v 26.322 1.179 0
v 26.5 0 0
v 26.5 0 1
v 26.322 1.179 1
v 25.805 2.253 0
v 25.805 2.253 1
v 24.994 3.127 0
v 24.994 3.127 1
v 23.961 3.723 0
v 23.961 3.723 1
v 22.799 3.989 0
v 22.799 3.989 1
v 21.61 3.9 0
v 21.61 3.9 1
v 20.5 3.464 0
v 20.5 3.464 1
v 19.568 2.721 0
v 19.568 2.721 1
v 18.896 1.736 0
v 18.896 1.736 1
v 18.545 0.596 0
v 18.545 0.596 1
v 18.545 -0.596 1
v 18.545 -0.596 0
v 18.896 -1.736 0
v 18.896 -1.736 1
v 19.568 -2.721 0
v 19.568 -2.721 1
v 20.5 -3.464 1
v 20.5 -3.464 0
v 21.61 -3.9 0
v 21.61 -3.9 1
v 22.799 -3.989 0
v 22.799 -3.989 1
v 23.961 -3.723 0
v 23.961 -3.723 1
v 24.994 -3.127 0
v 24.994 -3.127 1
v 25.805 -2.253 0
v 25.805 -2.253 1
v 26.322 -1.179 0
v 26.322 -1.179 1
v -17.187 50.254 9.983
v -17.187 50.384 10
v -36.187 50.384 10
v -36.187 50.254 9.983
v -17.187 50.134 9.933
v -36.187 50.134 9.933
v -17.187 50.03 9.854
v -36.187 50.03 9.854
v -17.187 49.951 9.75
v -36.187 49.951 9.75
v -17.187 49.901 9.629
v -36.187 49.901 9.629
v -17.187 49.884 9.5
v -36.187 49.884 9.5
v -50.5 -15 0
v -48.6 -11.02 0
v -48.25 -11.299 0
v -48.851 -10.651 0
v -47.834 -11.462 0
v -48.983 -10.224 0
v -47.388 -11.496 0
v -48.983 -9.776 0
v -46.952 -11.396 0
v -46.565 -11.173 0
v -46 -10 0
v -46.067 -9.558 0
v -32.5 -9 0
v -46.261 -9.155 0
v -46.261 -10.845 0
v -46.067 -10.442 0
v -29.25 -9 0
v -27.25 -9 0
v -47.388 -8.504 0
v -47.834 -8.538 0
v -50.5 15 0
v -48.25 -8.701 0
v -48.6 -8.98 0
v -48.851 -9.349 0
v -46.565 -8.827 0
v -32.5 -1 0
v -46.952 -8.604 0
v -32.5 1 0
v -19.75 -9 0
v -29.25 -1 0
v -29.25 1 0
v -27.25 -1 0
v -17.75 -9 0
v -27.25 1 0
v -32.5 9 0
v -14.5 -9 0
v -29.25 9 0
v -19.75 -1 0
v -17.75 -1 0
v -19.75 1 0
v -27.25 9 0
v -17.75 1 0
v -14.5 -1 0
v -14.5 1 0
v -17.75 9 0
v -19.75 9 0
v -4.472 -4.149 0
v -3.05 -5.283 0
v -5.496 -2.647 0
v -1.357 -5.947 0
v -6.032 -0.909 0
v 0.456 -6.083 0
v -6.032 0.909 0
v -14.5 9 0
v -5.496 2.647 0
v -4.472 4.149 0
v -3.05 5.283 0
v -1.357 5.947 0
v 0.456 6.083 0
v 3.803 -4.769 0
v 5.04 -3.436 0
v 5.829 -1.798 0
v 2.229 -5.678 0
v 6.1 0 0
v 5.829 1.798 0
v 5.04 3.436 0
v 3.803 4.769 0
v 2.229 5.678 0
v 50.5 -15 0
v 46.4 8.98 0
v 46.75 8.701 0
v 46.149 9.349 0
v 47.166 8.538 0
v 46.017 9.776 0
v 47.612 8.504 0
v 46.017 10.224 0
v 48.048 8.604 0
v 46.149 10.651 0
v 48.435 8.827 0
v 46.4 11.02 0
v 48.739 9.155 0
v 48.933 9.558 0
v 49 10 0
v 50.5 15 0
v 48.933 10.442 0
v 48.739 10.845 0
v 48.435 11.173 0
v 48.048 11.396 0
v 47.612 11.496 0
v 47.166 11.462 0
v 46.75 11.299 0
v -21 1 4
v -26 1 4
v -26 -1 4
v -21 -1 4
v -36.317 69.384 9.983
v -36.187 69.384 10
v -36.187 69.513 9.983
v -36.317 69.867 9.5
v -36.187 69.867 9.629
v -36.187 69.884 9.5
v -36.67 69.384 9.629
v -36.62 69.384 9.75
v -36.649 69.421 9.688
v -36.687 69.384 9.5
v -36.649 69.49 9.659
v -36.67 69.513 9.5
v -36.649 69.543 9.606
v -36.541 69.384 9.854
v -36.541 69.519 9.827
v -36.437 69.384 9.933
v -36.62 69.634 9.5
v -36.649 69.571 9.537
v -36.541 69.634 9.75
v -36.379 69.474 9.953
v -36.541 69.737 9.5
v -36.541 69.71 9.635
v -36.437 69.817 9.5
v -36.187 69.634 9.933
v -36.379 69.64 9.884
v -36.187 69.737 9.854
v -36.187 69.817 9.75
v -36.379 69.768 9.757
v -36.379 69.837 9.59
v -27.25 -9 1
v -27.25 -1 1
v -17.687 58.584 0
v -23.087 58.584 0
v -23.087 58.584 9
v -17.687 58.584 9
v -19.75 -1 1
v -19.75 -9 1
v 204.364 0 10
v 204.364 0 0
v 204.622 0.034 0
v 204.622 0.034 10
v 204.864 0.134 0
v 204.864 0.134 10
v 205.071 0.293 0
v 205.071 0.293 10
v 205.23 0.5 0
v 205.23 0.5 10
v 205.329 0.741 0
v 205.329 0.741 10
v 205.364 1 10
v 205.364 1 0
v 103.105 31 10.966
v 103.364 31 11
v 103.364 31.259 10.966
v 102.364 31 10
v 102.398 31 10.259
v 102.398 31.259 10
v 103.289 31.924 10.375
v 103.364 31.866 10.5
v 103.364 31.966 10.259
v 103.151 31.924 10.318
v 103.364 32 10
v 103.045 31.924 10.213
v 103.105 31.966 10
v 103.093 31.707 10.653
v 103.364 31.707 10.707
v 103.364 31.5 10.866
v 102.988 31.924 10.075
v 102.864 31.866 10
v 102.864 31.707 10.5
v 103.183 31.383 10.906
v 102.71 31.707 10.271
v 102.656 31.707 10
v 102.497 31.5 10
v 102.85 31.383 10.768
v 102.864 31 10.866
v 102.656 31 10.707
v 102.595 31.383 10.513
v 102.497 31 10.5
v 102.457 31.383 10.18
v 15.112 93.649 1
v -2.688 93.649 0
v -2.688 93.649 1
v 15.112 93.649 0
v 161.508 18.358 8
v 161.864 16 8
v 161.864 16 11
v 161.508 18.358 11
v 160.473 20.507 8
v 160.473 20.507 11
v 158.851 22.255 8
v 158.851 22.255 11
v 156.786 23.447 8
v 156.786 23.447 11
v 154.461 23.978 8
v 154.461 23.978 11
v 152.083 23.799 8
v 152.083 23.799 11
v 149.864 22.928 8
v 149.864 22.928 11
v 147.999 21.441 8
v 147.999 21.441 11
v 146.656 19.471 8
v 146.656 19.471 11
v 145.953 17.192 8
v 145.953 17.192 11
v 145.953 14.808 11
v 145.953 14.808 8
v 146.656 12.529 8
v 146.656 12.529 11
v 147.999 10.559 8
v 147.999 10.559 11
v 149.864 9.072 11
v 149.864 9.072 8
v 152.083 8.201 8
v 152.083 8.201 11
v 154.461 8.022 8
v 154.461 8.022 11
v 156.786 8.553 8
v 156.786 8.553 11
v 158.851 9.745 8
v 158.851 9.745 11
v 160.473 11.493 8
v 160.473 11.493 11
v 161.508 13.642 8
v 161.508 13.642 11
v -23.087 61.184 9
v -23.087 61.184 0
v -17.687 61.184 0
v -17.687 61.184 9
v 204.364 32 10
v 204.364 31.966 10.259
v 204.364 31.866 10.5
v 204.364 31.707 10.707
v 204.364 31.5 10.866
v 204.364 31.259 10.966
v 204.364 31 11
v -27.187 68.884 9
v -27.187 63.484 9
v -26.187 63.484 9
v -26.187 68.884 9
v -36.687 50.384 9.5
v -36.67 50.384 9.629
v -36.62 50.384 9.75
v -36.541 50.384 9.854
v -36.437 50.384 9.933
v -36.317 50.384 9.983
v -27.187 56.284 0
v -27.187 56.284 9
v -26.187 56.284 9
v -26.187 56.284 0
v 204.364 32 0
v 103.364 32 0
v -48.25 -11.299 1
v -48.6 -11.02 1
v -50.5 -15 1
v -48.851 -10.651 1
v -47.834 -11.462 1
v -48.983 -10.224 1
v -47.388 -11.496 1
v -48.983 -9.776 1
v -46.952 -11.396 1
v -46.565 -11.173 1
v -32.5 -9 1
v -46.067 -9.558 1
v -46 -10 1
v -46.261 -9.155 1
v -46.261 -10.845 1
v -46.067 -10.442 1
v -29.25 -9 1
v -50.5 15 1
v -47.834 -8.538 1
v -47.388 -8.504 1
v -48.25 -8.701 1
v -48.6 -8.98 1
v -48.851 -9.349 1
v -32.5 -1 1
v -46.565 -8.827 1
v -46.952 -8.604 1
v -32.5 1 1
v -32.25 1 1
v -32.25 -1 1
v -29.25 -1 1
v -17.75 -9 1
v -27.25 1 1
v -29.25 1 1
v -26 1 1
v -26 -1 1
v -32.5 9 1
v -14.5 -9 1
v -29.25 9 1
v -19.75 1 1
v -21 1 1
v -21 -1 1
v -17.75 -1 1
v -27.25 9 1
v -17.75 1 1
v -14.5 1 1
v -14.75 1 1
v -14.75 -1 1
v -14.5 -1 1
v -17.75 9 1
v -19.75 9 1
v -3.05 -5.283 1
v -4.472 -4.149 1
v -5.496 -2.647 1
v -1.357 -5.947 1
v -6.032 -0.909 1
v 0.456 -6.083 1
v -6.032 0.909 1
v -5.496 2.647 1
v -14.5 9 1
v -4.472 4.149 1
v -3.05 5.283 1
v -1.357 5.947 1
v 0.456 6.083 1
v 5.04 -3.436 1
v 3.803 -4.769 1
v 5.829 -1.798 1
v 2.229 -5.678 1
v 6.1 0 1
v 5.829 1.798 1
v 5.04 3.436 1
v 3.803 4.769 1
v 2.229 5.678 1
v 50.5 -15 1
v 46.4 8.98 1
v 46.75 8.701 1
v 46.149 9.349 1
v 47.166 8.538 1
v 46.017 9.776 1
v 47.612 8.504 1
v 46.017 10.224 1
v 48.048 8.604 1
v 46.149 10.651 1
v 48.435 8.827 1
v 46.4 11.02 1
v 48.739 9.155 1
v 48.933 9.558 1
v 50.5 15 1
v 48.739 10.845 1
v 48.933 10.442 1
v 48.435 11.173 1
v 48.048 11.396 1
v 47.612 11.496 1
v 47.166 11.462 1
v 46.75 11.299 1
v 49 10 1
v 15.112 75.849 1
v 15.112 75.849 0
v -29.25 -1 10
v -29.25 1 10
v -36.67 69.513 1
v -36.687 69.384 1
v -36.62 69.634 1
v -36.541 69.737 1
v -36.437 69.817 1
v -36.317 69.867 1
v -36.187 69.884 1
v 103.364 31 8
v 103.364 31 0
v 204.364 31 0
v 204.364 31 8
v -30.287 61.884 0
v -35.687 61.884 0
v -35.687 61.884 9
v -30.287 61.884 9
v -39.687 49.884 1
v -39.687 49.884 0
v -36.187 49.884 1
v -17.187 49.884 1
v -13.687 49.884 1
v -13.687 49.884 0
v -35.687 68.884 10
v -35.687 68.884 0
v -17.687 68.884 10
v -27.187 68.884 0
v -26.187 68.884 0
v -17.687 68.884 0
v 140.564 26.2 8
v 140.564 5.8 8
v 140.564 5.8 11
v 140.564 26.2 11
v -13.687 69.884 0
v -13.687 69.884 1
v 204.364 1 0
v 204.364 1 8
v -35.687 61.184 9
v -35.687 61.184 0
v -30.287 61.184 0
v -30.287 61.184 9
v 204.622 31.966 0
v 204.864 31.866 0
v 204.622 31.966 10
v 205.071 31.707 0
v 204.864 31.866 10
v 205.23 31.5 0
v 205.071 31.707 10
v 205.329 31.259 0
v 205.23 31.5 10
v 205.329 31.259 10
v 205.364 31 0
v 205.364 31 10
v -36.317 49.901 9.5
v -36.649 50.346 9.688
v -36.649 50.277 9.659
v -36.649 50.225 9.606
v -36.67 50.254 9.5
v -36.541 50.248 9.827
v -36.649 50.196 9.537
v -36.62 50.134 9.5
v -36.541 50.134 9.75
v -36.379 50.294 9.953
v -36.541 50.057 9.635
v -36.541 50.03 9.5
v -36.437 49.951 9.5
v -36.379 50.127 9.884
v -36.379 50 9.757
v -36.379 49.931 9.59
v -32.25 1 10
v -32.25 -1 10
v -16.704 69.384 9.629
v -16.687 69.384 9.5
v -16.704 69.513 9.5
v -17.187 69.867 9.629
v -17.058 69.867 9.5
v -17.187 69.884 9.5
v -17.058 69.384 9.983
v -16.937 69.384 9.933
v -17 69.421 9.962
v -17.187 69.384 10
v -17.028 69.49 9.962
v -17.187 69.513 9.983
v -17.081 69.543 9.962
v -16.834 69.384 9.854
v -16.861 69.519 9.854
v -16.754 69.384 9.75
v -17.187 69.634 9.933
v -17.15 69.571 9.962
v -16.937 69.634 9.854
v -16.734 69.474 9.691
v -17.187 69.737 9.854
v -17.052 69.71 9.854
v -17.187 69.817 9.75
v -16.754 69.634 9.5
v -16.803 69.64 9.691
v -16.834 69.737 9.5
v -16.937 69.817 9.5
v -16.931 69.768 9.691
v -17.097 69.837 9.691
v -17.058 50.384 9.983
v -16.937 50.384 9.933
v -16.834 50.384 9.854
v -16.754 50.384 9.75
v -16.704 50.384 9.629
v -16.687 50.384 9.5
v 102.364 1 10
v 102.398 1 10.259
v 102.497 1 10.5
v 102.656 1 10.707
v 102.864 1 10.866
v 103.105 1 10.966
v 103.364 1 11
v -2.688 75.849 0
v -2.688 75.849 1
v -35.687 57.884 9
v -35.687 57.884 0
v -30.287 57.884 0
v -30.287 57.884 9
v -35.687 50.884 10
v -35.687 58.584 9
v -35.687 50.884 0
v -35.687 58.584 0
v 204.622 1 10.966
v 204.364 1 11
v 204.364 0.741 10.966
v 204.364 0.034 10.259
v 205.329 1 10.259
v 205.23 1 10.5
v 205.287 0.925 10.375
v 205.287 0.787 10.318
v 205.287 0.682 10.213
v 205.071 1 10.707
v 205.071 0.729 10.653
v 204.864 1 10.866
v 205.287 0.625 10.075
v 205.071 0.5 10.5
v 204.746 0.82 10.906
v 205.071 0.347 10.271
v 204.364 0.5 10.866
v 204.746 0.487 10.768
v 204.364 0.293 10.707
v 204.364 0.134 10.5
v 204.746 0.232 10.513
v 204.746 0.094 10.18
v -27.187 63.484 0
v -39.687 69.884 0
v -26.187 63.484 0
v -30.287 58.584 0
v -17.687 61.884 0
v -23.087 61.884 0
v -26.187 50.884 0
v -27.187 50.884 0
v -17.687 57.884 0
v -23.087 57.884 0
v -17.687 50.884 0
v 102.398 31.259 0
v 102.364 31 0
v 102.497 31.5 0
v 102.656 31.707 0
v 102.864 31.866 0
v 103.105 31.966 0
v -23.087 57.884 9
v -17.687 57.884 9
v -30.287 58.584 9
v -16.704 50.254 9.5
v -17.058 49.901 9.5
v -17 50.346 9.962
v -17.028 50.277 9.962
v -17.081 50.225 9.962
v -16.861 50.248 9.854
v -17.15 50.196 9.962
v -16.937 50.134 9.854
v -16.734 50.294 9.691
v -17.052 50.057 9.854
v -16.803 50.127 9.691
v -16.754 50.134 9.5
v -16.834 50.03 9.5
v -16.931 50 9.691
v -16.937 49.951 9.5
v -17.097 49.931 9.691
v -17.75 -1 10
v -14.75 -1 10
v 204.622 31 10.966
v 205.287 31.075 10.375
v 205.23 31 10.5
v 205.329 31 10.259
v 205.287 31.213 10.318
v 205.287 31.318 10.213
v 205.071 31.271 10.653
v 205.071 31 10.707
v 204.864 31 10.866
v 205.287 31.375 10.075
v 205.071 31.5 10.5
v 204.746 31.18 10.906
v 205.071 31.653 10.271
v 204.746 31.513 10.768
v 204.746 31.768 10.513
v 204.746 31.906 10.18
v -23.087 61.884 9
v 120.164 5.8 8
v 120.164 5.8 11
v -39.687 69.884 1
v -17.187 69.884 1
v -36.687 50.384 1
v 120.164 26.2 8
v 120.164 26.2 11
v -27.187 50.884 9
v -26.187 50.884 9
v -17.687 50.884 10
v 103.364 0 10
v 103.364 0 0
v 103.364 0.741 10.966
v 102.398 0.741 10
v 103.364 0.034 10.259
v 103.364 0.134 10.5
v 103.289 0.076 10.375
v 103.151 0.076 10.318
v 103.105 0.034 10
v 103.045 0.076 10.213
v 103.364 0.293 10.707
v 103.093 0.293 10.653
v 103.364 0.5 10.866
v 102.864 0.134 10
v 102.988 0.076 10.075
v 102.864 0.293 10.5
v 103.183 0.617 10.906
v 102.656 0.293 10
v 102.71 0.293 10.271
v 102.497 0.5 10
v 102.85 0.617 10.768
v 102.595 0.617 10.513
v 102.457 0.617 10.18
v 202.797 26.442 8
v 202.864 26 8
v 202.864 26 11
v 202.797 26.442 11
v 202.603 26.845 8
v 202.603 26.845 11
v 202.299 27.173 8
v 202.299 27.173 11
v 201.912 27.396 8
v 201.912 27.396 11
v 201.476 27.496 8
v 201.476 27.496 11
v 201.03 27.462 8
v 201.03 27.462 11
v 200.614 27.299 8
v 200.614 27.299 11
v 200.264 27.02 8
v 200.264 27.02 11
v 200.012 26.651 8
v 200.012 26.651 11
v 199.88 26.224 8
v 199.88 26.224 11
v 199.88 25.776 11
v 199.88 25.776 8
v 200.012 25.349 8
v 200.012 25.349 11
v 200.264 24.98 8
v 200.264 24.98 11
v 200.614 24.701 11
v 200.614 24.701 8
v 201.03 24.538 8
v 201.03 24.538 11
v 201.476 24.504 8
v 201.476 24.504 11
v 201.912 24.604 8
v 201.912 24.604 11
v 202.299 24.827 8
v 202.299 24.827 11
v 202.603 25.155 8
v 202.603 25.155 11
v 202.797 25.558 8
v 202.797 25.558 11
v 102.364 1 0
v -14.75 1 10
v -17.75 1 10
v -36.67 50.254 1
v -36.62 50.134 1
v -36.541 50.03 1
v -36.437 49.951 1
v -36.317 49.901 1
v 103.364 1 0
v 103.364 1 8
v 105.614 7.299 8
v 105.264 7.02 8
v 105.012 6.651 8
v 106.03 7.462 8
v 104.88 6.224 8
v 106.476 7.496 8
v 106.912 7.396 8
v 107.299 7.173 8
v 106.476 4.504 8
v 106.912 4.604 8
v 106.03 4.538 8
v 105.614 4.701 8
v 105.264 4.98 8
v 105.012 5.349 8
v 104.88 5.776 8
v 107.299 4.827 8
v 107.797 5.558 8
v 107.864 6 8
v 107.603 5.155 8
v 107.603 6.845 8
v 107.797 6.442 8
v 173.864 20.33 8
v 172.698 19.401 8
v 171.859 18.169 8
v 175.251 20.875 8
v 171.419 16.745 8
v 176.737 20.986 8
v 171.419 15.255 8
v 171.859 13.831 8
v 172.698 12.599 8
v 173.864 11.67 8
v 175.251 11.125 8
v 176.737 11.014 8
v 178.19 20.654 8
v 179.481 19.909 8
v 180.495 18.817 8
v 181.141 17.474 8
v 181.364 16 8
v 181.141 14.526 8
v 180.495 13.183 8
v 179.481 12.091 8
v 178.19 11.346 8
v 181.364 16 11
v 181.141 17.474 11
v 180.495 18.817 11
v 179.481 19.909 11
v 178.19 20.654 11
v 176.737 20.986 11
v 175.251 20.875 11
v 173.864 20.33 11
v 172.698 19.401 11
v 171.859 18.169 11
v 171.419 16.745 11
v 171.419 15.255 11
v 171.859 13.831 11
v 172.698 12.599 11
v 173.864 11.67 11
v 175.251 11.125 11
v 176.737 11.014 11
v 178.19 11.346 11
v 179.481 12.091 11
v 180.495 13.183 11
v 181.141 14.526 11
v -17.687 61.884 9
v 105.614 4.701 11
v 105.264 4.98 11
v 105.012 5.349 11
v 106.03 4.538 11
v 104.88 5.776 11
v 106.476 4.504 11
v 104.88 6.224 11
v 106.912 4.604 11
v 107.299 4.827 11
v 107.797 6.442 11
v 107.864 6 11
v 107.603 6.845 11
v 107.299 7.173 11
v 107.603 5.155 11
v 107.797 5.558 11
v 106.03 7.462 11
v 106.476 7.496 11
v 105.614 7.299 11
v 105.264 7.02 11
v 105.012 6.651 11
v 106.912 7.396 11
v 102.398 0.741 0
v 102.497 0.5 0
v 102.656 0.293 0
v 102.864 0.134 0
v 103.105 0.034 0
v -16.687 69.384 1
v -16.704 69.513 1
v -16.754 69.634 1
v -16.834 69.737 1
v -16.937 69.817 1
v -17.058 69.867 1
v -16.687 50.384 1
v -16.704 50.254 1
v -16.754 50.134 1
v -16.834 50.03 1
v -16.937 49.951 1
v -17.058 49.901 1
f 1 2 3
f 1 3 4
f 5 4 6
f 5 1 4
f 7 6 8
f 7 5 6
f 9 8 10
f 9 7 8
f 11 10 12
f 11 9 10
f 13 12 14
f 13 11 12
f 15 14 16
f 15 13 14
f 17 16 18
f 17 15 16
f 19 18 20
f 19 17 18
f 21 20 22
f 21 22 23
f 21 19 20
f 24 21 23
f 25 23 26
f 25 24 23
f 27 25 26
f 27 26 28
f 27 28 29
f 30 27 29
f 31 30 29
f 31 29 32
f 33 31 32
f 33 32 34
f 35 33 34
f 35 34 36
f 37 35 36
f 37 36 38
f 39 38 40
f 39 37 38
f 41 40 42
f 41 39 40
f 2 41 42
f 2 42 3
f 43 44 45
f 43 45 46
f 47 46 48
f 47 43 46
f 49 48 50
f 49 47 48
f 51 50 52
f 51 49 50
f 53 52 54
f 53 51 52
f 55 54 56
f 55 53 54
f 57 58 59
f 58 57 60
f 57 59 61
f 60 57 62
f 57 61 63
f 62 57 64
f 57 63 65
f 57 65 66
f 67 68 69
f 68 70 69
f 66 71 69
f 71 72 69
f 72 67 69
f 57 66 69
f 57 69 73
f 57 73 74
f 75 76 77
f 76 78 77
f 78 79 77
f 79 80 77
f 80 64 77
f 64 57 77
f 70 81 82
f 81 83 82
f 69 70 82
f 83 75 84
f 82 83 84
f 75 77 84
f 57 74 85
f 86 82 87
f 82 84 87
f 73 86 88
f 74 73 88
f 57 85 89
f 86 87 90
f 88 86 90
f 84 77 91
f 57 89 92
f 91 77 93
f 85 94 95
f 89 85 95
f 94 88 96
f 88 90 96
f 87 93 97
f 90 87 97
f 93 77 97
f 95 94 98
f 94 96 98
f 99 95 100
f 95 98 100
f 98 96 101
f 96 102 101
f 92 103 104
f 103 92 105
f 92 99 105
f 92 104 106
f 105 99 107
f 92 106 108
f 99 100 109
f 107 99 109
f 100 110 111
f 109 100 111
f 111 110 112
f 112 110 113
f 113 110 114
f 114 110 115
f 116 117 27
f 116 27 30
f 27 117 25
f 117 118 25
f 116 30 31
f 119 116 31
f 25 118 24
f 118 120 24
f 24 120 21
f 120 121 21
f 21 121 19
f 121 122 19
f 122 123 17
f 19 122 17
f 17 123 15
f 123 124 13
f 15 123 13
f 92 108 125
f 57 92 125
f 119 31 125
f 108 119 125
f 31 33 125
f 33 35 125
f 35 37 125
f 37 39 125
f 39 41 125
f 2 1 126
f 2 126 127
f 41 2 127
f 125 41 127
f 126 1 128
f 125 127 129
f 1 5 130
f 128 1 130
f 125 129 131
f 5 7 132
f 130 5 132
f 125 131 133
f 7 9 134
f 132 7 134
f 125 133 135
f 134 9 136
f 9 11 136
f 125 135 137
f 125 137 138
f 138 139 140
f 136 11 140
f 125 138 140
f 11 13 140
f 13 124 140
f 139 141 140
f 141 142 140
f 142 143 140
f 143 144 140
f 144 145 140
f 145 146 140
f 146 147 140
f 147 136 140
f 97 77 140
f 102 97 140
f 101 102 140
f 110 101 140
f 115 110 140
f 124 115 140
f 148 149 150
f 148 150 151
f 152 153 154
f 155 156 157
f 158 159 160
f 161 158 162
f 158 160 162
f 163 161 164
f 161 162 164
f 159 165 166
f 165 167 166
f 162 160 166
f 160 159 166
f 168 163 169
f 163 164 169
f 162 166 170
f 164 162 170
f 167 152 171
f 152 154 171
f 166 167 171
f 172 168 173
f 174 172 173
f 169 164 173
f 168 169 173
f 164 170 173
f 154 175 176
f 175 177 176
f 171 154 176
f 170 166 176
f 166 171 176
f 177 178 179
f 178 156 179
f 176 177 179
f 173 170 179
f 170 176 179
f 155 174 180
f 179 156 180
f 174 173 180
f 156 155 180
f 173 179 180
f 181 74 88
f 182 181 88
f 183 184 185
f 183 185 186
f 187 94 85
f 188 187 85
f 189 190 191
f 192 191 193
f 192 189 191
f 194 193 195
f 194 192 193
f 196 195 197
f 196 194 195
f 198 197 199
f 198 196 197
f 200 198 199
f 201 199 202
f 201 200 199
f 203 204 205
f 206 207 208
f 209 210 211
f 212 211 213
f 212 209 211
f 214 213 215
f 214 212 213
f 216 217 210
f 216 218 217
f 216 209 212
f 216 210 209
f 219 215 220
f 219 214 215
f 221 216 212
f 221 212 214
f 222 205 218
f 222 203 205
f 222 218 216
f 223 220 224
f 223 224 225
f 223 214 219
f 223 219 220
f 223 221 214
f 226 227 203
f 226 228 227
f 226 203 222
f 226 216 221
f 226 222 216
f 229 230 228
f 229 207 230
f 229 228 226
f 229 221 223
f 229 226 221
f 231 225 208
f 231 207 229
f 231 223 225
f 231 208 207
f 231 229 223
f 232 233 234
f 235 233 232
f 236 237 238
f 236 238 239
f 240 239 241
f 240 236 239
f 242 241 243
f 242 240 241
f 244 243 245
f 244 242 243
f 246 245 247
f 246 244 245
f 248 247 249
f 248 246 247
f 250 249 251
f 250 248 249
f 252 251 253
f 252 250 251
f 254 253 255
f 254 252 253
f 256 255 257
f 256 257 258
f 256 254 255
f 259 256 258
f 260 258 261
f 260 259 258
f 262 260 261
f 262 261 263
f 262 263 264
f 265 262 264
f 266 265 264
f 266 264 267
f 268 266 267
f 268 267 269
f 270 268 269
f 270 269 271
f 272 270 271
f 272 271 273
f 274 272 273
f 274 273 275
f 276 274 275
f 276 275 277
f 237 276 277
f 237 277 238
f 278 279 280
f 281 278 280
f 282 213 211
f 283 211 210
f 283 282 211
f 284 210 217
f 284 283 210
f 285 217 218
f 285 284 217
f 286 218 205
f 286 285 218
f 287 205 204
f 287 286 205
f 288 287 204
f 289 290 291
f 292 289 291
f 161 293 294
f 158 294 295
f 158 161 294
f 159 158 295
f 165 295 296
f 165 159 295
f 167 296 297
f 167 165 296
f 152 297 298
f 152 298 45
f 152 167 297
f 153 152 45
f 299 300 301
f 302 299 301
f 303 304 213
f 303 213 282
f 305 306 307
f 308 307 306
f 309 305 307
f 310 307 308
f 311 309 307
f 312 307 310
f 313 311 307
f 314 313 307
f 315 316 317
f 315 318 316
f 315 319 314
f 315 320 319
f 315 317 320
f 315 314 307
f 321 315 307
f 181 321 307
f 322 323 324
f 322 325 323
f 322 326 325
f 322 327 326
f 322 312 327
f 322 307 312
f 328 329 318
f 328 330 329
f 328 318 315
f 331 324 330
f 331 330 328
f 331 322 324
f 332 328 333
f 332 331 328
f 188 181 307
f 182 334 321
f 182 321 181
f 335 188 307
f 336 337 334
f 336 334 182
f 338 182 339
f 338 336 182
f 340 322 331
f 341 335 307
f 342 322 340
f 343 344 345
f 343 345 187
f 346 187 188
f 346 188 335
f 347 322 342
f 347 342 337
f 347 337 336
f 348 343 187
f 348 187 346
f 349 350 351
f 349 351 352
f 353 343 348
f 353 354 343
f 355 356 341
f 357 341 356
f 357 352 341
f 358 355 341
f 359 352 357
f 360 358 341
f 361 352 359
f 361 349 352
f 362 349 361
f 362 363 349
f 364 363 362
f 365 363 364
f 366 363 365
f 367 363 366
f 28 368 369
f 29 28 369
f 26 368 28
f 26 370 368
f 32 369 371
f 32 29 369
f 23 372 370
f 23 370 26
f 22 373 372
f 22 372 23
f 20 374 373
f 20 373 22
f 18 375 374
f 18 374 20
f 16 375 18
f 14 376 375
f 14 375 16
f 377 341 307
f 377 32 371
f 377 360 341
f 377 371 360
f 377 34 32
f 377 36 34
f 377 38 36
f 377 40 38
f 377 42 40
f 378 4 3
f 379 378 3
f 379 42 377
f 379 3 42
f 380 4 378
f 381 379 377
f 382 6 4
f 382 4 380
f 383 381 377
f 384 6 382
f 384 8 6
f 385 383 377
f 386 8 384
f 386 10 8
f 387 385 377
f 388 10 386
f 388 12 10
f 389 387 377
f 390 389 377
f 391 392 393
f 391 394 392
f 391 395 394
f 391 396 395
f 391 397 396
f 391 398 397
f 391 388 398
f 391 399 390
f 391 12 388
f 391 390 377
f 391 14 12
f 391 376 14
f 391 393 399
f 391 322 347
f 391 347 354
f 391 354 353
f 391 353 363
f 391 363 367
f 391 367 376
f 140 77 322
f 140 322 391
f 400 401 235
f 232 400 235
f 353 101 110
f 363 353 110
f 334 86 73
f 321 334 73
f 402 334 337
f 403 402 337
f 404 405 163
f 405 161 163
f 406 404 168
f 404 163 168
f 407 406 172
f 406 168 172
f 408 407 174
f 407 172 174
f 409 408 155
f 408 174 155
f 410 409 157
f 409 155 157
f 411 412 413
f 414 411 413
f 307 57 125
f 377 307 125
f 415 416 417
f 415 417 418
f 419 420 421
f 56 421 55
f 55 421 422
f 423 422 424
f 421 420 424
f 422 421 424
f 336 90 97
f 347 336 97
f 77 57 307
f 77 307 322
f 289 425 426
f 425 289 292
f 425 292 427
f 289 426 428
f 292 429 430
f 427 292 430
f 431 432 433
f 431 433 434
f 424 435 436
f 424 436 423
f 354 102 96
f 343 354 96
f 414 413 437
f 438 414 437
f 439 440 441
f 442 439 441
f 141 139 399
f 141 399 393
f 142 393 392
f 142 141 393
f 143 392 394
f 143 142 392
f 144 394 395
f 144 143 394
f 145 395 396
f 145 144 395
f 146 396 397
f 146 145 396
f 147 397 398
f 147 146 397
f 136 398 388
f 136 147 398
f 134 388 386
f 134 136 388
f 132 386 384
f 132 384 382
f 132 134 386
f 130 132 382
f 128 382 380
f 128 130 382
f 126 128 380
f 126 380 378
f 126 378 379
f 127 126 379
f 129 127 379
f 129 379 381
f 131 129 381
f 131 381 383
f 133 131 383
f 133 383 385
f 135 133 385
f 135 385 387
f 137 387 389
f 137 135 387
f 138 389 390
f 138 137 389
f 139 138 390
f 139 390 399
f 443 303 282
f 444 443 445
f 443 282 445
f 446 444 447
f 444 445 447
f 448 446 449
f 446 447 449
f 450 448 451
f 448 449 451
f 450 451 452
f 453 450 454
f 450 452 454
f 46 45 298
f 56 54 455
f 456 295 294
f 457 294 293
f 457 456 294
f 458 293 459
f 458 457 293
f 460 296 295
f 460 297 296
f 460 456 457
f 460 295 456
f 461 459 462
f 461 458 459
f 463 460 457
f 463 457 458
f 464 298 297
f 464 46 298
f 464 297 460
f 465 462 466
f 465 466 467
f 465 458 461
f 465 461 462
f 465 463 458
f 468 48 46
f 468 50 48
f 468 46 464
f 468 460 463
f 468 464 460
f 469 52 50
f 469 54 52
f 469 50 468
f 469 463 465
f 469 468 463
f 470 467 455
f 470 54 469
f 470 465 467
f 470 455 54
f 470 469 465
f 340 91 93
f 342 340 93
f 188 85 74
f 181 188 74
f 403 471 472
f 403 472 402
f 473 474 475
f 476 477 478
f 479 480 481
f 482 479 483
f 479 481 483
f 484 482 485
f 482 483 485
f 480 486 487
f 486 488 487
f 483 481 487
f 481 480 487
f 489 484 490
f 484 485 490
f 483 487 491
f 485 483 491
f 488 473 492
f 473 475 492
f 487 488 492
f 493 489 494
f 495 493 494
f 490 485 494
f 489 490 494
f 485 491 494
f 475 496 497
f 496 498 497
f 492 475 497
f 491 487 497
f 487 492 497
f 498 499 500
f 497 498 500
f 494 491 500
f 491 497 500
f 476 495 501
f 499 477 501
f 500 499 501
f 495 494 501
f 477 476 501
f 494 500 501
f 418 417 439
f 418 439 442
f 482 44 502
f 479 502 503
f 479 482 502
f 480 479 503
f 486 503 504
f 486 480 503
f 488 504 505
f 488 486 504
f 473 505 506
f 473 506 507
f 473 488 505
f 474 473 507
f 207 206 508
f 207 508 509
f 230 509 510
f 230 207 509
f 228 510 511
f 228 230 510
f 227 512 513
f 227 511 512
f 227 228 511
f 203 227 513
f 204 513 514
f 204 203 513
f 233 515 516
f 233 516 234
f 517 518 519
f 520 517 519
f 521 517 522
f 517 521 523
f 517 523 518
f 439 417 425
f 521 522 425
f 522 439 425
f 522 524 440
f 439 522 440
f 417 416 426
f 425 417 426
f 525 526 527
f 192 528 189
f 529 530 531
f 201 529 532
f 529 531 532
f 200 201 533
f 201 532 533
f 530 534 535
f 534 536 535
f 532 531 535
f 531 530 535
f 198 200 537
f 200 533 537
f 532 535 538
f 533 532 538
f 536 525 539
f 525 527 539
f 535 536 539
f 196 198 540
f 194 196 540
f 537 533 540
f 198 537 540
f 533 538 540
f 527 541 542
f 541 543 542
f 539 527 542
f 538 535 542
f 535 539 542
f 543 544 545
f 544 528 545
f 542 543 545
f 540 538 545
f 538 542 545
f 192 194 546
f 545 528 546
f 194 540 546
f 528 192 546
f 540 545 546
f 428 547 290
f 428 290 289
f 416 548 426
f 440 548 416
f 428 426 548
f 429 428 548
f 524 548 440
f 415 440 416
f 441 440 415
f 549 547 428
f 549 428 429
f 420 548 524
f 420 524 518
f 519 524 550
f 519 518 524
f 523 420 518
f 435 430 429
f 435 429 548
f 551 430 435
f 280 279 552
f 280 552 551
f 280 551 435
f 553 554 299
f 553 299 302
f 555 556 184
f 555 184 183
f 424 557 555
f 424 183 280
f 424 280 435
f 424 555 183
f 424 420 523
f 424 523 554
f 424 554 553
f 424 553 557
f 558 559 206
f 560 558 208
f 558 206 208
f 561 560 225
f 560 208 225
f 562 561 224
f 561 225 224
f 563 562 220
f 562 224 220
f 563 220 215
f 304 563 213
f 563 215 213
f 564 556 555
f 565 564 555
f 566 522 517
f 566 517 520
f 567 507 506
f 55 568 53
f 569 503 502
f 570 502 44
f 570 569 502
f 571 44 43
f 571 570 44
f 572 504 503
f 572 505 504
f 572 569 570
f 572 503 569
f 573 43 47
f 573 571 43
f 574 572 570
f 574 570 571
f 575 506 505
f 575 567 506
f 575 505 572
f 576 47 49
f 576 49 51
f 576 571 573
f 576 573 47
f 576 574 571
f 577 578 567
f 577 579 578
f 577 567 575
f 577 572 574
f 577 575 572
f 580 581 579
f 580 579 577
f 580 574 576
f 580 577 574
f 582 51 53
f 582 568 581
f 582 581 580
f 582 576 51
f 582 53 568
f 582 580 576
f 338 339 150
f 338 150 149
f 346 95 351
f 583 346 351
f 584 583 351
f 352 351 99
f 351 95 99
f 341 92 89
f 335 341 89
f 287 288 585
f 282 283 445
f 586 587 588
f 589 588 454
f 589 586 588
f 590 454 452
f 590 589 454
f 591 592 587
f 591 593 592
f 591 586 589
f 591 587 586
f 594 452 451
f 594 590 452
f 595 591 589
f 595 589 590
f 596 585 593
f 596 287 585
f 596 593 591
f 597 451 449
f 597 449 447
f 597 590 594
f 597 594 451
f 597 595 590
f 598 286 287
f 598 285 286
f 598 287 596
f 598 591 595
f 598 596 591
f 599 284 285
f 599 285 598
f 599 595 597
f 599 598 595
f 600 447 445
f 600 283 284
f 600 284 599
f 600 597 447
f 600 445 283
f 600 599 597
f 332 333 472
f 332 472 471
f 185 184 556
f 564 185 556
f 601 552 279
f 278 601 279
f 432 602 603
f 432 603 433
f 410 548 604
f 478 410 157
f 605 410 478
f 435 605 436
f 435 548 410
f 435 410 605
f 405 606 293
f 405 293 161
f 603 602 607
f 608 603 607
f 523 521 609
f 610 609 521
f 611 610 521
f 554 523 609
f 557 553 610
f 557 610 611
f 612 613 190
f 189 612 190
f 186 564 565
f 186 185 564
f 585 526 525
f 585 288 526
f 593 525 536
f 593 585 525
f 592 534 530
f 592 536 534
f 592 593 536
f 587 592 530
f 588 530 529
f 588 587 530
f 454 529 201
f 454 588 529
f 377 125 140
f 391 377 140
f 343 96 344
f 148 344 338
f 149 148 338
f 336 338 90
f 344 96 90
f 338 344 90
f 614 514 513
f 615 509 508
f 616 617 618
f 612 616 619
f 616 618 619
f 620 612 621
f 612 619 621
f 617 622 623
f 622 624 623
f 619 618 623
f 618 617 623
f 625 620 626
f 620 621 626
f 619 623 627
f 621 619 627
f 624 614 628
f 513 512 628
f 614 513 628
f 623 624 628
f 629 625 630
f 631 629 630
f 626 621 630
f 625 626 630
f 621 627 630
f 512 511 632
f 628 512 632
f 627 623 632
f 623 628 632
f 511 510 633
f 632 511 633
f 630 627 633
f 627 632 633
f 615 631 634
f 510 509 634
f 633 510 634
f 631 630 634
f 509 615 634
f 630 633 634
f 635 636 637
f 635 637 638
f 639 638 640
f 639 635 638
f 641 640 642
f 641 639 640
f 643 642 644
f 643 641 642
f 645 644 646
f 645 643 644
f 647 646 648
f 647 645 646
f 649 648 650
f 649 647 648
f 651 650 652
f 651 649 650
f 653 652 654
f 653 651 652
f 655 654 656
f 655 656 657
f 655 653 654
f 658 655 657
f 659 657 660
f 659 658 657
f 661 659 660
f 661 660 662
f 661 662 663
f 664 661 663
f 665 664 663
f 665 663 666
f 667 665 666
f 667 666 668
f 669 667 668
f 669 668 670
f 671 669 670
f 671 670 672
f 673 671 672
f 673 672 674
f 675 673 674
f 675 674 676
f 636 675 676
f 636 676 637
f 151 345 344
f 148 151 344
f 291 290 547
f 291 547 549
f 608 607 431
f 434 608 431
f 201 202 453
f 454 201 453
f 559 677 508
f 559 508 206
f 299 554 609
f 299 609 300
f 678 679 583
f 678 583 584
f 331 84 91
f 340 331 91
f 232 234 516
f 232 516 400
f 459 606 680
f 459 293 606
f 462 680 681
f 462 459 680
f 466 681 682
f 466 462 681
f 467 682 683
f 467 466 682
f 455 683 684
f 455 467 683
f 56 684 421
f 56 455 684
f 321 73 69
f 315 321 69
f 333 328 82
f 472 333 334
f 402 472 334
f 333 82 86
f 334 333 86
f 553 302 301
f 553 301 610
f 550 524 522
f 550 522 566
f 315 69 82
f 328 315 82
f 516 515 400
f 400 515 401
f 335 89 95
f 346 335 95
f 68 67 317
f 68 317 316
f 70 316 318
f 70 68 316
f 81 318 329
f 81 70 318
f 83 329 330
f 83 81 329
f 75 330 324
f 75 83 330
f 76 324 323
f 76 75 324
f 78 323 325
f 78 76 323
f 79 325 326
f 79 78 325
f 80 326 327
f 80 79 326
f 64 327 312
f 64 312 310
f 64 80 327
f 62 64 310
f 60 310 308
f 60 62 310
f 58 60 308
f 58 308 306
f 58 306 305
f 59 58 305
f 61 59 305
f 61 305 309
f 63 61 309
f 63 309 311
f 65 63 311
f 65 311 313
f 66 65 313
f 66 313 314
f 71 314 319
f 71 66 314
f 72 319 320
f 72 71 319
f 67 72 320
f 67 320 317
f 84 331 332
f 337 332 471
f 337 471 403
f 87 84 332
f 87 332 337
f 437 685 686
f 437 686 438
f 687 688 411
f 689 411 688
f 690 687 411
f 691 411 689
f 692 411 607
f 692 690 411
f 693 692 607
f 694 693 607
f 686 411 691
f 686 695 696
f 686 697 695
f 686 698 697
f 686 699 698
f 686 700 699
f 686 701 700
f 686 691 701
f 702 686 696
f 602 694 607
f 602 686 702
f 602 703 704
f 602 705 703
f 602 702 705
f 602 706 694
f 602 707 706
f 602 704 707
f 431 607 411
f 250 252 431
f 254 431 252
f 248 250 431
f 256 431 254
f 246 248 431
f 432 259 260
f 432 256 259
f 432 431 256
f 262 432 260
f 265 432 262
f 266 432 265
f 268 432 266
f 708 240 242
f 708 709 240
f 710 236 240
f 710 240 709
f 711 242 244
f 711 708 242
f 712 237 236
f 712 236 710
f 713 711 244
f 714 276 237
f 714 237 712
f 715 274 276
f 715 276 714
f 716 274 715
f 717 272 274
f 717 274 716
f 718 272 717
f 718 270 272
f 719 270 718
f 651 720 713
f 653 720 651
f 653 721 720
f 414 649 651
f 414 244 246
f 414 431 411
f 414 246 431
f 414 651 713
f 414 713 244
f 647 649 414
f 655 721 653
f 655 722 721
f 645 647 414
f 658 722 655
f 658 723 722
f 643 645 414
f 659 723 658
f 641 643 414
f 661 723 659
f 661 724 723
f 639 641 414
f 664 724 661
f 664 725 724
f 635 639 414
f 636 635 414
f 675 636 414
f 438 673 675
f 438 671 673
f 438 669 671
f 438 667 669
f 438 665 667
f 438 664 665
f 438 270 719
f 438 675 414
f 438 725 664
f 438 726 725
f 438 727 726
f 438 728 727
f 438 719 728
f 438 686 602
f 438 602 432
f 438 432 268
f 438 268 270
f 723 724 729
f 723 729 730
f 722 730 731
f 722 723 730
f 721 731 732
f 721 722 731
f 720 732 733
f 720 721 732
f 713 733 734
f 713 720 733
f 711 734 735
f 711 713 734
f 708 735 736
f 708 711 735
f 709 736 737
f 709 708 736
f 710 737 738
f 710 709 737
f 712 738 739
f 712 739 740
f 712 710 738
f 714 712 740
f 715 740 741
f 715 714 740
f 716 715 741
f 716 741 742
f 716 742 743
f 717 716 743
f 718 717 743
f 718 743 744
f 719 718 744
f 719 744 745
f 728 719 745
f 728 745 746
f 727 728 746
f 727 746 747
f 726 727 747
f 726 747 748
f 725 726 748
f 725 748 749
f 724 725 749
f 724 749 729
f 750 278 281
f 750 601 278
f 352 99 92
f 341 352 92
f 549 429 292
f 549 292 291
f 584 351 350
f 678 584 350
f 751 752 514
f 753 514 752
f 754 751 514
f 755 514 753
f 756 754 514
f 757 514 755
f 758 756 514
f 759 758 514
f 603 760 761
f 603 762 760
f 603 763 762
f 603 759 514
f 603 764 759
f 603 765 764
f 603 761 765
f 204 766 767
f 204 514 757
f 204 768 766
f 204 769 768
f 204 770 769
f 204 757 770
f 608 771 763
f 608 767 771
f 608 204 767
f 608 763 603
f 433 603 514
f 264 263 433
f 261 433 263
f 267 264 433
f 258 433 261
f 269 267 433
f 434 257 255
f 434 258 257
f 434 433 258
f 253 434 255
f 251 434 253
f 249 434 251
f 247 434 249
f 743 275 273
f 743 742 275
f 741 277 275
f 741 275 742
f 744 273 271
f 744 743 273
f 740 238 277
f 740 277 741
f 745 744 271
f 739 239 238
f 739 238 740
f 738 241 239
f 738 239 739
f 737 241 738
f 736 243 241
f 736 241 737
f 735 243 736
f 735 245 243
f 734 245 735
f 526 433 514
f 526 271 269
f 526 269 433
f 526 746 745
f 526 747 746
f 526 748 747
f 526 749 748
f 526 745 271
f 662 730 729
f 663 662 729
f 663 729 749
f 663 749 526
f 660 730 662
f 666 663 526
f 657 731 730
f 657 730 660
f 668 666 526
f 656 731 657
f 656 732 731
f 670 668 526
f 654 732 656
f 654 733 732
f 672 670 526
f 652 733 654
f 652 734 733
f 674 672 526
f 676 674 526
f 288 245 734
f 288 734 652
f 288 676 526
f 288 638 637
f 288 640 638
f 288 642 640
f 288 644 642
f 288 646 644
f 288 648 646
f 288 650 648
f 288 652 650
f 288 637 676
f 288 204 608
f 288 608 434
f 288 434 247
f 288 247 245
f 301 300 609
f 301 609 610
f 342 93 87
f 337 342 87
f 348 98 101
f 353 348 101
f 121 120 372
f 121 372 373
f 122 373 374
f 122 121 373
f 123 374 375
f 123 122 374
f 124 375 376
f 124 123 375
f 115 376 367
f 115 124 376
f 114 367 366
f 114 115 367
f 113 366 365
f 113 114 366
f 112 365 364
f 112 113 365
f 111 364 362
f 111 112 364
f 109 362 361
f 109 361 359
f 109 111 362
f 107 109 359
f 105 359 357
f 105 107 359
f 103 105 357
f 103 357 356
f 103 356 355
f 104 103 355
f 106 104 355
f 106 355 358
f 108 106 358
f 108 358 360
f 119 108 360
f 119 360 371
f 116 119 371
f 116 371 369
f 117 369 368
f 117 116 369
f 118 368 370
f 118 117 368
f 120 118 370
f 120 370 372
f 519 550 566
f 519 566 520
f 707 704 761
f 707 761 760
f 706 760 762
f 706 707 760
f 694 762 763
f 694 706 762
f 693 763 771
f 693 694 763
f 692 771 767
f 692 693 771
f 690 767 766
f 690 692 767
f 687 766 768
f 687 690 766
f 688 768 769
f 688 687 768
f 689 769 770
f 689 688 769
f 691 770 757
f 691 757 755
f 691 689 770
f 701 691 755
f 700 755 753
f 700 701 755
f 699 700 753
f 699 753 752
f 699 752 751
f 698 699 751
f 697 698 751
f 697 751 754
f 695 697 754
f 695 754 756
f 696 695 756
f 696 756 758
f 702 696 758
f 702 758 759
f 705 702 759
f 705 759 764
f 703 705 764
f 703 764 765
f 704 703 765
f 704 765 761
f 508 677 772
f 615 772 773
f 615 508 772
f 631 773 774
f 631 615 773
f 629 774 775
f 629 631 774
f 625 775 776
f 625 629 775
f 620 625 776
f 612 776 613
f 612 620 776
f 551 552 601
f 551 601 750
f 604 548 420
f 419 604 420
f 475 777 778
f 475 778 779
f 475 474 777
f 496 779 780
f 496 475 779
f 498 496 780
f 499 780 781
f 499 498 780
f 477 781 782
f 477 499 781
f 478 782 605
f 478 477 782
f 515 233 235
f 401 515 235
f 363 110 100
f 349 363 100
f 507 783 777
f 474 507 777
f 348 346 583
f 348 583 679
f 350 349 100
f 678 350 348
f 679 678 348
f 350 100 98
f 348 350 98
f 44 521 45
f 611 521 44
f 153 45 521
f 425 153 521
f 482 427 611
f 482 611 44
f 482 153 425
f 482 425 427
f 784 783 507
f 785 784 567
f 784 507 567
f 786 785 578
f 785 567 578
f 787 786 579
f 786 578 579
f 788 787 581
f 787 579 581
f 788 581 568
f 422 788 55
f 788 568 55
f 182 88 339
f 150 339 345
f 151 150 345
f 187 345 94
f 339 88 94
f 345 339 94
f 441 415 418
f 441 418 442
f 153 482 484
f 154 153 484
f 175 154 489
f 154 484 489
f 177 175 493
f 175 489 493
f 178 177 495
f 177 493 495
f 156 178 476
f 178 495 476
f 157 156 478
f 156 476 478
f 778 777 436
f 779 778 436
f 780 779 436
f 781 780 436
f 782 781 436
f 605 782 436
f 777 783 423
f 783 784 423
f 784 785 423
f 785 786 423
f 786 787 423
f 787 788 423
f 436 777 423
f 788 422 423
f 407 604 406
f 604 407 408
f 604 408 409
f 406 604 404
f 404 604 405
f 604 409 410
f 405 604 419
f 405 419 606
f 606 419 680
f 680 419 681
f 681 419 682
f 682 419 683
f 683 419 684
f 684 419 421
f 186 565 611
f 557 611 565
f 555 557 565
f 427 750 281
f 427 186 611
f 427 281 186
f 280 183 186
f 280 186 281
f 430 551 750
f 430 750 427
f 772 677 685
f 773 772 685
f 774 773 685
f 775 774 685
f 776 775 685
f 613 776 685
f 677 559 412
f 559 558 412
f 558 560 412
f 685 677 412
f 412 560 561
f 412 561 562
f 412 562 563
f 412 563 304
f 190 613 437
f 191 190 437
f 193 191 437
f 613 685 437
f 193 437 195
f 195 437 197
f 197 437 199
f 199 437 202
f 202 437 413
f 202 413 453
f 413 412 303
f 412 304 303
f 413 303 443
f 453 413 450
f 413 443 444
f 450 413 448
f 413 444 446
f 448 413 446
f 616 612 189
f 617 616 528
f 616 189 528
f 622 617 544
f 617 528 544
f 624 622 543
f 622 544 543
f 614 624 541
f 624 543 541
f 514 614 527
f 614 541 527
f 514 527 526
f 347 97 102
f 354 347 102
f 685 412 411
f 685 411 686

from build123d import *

# Parameters (mm, degrees)
F0_W      = 101
F0_H      = 30
F0_R      = 1.5
F0_R_2    = 6.1
F0_R_3    = 4
F1_DEPTH  = 1
F2_W      = 3
F2_H      = 2
F3_DEPTH  = 9
F4_W      = 20
F4_H      = 20
F5_DEPTH  = 10
F6_T      = -1
F7_W      = 8.5
F7_H      = 0.7
F8_DEPTH  = 9
F9_W      = 7.2
F9_H      = 7.2
F10_DEPTH = 9
F11_W     = 3
F11_H     = 20
F12_DEPTH = 1
F13_W     = 18
F13_H     = 18
F14_DEPTH = 1
F15_R     = 0.5
F4_W_2    = 17.8
F4_H_2    = 17.8
F16_DEPTH = 1
F17_W     = 5
F17_H     = 2
F18_DEPTH = 3
F19_W     = 103
F19_H     = 32
F19_R     = 1.5
F19_W_2   = 20.4
F19_H_2   = 20.4
F19_R_2   = 8
F19_R_3   = 5
F20_DEPTH = 11
F21_W     = 101
F21_H     = 30
F22_DEPTH = 8
F23_R     = 1


with BuildPart() as f1:
    # F0 (on Top) → F1 (new body)
    with BuildSketch(Plane.XY):
        Rectangle(F0_W, F0_H)
        with Locations((-47.5, -10)):
            Circle(F0_R, mode=Mode.SUBTRACT)
        Polygon((-32.5, 1), (-32.5, 9), (-29.25, 9), (-27.25, 9), (-19.75, 9), (-17.75, 9), (-14.5, 9), (-14.5, 1), (-14.5, -1), (-14.5, -9), (-17.75, -9), (-19.75, -9), (-27.25, -9), (-29.25, -9), (-32.5, -9), (-32.5, -1), align=None, mode=Mode.SUBTRACT)
        Circle(F0_R_2, mode=Mode.SUBTRACT)
        with Locations((22.5, 0)):
            Circle(F0_R_3, mode=Mode.SUBTRACT)
        with Locations((47.5, 10)):
            Circle(F0_R, mode=Mode.SUBTRACT)
        Polygon((-27.25, 9), (-29.25, 9), (-29.25, 1), (-32.5, 1), (-32.5, -1), (-29.25, -1), (-29.25, -9), (-27.25, -9), (-27.25, -1), (-19.75, -1), (-19.75, -9), (-17.75, -9), (-17.75, -1), (-14.5, -1), (-14.5, 1), (-17.75, 1), (-17.75, 9), (-19.75, 9), (-19.75, 1), (-27.25, 1), align=None)
    extrude(amount=F1_DEPTH)

    # F2 (on face) → F3 (join)
    with BuildSketch(Plane.XY.offset(1)):
        with Locations((-30.75, 0)):
            Rectangle(F2_W, F2_H)
        with Locations((-16.25, 0)):
            Rectangle(F2_W, F2_H)
    extrude(amount=F3_DEPTH)

    # F17 (on face) → F18 (join)
    with BuildSketch(Plane.XY.offset(1)):
        with Locations((-23.5, 0)):
            Rectangle(F17_W, F17_H)
    extrude(amount=F18_DEPTH)


with BuildPart() as f5:
    # F4 (on Top) → F5 (new body)
    with BuildSketch(Plane.XY):
        with Locations((-26.687329, 59.883659)):
            Rectangle(F4_W, F4_H)
    extrude(amount=F5_DEPTH)

    # F6
    f6_openings = [f5.faces().sort_by_distance(p)[0] for p in [
        (-26.687329, 59.883659, 0),
    ]]
    offset(amount=F6_T, openings=f6_openings)

    # F7 (on face) → F8 (join)
    with BuildSketch(Plane(origin=(0, 0, 0), x_dir=(1, 0, 0), z_dir=(0, 0, -1))):
        with Locations((-31.437329, -58.233659)):
            Rectangle(F7_W, F7_H)
        Polygon((-27.187329, -50.883659), (-27.187329, -57.883659), (-27.187329, -58.583659), (-27.187329, -61.183659), (-27.187329, -61.883659), (-27.187329, -68.883659), (-26.187329, -68.883659), (-26.187329, -61.883659), (-26.187329, -61.183659), (-26.187329, -58.583659), (-26.187329, -57.883659), (-26.187329, -50.883659), align=None)
        with Locations((-31.437329, -61.533659)):
            Rectangle(F7_W, F7_H)
        with Locations((-21.937329, -58.233659)):
            Rectangle(F7_W, F7_H)
        with Locations((-21.937329, -61.533659)):
            Rectangle(F7_W, F7_H)
    extrude(amount=-F8_DEPTH)

    # F9 (on face) → F10 (cut)
    with BuildSketch(Plane(origin=(0, 0, 0), x_dir=(1, 0, 0), z_dir=(0, 0, -1))):
        with Locations((-26.687329, -59.883659)):
            Rectangle(F9_W, F9_H)
    extrude(amount=-F10_DEPTH, mode=Mode.SUBTRACT)

    # F11 (on face) → F12 (join)
    with BuildSketch(Plane(origin=(0, 0, 0), x_dir=(1, 0, 0), z_dir=(0, 0, -1))):
        with Locations((-38.187329, -59.883659)):
            Rectangle(F11_W, F11_H)
        with Locations((-15.187329, -59.883659)):
            Rectangle(F11_W, F11_H)
    extrude(amount=-F12_DEPTH)

    # F13 (on face) → F14 (cut)
    with BuildSketch(Plane.XY.offset(10)):
        with Locations((-26.687329, 59.883659)):
            Rectangle(F13_W, F13_H)
    extrude(amount=-F14_DEPTH, mode=Mode.SUBTRACT)

    # F15
    f15_edges = [f5.edges().sort_by_distance(p)[0] for p in [
        (-16.687329, 49.883659, 5.5),
        (-16.687329, 69.883659, 5.5),
        (-16.687329, 59.883659, 10),
        (-26.687329, 69.883659, 10),
        (-26.687329, 49.883659, 10),
        (-36.687329, 59.883659, 10),
        (-36.687329, 49.883659, 5.5),
        (-36.687329, 69.883659, 5.5),
    ]]
    fillet(f15_edges, radius=F15_R)


with BuildPart() as f16:
    # F4 (on Top) → F16 (new body)
    with BuildSketch(Plane.XY):
        with Locations((6.211989, 84.749466)):
            Rectangle(F4_W_2, F4_H_2)
    extrude(amount=F16_DEPTH)


with BuildPart() as f20:
    # F19 (on Top) → F20 (new body)
    with BuildSketch(Plane.XY):
        with Locations((153.863519, 16)):
            Rectangle(F19_W, F19_H)
        with Locations((106.363519, 6)):
            Circle(F19_R, mode=Mode.SUBTRACT)
        with Locations((130.363519, 16)):
            Rectangle(F19_W_2, F19_H_2, mode=Mode.SUBTRACT)
        with Locations((153.863519, 16)):
            Circle(F19_R_2, mode=Mode.SUBTRACT)
        with Locations((176.363519, 16)):
            Circle(F19_R_3, mode=Mode.SUBTRACT)
        with Locations((201.363519, 26)):
            Circle(F19_R, mode=Mode.SUBTRACT)
    extrude(amount=F20_DEPTH)

    # F21 (on face) → F22 (cut)
    with BuildSketch(Plane(origin=(0, 0, 0), x_dir=(1, 0, 0), z_dir=(0, 0, -1))):
        with Locations((153.863519, -16)):
            Rectangle(F21_W, F21_H)
    extrude(amount=-F22_DEPTH, mode=Mode.SUBTRACT)

    # F23
    f23_edges = [f20.edges().sort_by_distance(p)[0] for p in [
        (102.363519, 16, 11),
        (153.863519, 32, 11),
        (153.863519, 0, 11),
        (205.363519, 16, 11),
        (205.363519, 32, 5.5),
        (205.363519, 0, 5.5),
        (102.363519, 32, 5.5),
        (102.363519, 0, 5.5),
    ]]
    fillet(f23_edges, radius=F23_R)


solid = Compound([f1.part, f5.part, f16.part, f20.part])
